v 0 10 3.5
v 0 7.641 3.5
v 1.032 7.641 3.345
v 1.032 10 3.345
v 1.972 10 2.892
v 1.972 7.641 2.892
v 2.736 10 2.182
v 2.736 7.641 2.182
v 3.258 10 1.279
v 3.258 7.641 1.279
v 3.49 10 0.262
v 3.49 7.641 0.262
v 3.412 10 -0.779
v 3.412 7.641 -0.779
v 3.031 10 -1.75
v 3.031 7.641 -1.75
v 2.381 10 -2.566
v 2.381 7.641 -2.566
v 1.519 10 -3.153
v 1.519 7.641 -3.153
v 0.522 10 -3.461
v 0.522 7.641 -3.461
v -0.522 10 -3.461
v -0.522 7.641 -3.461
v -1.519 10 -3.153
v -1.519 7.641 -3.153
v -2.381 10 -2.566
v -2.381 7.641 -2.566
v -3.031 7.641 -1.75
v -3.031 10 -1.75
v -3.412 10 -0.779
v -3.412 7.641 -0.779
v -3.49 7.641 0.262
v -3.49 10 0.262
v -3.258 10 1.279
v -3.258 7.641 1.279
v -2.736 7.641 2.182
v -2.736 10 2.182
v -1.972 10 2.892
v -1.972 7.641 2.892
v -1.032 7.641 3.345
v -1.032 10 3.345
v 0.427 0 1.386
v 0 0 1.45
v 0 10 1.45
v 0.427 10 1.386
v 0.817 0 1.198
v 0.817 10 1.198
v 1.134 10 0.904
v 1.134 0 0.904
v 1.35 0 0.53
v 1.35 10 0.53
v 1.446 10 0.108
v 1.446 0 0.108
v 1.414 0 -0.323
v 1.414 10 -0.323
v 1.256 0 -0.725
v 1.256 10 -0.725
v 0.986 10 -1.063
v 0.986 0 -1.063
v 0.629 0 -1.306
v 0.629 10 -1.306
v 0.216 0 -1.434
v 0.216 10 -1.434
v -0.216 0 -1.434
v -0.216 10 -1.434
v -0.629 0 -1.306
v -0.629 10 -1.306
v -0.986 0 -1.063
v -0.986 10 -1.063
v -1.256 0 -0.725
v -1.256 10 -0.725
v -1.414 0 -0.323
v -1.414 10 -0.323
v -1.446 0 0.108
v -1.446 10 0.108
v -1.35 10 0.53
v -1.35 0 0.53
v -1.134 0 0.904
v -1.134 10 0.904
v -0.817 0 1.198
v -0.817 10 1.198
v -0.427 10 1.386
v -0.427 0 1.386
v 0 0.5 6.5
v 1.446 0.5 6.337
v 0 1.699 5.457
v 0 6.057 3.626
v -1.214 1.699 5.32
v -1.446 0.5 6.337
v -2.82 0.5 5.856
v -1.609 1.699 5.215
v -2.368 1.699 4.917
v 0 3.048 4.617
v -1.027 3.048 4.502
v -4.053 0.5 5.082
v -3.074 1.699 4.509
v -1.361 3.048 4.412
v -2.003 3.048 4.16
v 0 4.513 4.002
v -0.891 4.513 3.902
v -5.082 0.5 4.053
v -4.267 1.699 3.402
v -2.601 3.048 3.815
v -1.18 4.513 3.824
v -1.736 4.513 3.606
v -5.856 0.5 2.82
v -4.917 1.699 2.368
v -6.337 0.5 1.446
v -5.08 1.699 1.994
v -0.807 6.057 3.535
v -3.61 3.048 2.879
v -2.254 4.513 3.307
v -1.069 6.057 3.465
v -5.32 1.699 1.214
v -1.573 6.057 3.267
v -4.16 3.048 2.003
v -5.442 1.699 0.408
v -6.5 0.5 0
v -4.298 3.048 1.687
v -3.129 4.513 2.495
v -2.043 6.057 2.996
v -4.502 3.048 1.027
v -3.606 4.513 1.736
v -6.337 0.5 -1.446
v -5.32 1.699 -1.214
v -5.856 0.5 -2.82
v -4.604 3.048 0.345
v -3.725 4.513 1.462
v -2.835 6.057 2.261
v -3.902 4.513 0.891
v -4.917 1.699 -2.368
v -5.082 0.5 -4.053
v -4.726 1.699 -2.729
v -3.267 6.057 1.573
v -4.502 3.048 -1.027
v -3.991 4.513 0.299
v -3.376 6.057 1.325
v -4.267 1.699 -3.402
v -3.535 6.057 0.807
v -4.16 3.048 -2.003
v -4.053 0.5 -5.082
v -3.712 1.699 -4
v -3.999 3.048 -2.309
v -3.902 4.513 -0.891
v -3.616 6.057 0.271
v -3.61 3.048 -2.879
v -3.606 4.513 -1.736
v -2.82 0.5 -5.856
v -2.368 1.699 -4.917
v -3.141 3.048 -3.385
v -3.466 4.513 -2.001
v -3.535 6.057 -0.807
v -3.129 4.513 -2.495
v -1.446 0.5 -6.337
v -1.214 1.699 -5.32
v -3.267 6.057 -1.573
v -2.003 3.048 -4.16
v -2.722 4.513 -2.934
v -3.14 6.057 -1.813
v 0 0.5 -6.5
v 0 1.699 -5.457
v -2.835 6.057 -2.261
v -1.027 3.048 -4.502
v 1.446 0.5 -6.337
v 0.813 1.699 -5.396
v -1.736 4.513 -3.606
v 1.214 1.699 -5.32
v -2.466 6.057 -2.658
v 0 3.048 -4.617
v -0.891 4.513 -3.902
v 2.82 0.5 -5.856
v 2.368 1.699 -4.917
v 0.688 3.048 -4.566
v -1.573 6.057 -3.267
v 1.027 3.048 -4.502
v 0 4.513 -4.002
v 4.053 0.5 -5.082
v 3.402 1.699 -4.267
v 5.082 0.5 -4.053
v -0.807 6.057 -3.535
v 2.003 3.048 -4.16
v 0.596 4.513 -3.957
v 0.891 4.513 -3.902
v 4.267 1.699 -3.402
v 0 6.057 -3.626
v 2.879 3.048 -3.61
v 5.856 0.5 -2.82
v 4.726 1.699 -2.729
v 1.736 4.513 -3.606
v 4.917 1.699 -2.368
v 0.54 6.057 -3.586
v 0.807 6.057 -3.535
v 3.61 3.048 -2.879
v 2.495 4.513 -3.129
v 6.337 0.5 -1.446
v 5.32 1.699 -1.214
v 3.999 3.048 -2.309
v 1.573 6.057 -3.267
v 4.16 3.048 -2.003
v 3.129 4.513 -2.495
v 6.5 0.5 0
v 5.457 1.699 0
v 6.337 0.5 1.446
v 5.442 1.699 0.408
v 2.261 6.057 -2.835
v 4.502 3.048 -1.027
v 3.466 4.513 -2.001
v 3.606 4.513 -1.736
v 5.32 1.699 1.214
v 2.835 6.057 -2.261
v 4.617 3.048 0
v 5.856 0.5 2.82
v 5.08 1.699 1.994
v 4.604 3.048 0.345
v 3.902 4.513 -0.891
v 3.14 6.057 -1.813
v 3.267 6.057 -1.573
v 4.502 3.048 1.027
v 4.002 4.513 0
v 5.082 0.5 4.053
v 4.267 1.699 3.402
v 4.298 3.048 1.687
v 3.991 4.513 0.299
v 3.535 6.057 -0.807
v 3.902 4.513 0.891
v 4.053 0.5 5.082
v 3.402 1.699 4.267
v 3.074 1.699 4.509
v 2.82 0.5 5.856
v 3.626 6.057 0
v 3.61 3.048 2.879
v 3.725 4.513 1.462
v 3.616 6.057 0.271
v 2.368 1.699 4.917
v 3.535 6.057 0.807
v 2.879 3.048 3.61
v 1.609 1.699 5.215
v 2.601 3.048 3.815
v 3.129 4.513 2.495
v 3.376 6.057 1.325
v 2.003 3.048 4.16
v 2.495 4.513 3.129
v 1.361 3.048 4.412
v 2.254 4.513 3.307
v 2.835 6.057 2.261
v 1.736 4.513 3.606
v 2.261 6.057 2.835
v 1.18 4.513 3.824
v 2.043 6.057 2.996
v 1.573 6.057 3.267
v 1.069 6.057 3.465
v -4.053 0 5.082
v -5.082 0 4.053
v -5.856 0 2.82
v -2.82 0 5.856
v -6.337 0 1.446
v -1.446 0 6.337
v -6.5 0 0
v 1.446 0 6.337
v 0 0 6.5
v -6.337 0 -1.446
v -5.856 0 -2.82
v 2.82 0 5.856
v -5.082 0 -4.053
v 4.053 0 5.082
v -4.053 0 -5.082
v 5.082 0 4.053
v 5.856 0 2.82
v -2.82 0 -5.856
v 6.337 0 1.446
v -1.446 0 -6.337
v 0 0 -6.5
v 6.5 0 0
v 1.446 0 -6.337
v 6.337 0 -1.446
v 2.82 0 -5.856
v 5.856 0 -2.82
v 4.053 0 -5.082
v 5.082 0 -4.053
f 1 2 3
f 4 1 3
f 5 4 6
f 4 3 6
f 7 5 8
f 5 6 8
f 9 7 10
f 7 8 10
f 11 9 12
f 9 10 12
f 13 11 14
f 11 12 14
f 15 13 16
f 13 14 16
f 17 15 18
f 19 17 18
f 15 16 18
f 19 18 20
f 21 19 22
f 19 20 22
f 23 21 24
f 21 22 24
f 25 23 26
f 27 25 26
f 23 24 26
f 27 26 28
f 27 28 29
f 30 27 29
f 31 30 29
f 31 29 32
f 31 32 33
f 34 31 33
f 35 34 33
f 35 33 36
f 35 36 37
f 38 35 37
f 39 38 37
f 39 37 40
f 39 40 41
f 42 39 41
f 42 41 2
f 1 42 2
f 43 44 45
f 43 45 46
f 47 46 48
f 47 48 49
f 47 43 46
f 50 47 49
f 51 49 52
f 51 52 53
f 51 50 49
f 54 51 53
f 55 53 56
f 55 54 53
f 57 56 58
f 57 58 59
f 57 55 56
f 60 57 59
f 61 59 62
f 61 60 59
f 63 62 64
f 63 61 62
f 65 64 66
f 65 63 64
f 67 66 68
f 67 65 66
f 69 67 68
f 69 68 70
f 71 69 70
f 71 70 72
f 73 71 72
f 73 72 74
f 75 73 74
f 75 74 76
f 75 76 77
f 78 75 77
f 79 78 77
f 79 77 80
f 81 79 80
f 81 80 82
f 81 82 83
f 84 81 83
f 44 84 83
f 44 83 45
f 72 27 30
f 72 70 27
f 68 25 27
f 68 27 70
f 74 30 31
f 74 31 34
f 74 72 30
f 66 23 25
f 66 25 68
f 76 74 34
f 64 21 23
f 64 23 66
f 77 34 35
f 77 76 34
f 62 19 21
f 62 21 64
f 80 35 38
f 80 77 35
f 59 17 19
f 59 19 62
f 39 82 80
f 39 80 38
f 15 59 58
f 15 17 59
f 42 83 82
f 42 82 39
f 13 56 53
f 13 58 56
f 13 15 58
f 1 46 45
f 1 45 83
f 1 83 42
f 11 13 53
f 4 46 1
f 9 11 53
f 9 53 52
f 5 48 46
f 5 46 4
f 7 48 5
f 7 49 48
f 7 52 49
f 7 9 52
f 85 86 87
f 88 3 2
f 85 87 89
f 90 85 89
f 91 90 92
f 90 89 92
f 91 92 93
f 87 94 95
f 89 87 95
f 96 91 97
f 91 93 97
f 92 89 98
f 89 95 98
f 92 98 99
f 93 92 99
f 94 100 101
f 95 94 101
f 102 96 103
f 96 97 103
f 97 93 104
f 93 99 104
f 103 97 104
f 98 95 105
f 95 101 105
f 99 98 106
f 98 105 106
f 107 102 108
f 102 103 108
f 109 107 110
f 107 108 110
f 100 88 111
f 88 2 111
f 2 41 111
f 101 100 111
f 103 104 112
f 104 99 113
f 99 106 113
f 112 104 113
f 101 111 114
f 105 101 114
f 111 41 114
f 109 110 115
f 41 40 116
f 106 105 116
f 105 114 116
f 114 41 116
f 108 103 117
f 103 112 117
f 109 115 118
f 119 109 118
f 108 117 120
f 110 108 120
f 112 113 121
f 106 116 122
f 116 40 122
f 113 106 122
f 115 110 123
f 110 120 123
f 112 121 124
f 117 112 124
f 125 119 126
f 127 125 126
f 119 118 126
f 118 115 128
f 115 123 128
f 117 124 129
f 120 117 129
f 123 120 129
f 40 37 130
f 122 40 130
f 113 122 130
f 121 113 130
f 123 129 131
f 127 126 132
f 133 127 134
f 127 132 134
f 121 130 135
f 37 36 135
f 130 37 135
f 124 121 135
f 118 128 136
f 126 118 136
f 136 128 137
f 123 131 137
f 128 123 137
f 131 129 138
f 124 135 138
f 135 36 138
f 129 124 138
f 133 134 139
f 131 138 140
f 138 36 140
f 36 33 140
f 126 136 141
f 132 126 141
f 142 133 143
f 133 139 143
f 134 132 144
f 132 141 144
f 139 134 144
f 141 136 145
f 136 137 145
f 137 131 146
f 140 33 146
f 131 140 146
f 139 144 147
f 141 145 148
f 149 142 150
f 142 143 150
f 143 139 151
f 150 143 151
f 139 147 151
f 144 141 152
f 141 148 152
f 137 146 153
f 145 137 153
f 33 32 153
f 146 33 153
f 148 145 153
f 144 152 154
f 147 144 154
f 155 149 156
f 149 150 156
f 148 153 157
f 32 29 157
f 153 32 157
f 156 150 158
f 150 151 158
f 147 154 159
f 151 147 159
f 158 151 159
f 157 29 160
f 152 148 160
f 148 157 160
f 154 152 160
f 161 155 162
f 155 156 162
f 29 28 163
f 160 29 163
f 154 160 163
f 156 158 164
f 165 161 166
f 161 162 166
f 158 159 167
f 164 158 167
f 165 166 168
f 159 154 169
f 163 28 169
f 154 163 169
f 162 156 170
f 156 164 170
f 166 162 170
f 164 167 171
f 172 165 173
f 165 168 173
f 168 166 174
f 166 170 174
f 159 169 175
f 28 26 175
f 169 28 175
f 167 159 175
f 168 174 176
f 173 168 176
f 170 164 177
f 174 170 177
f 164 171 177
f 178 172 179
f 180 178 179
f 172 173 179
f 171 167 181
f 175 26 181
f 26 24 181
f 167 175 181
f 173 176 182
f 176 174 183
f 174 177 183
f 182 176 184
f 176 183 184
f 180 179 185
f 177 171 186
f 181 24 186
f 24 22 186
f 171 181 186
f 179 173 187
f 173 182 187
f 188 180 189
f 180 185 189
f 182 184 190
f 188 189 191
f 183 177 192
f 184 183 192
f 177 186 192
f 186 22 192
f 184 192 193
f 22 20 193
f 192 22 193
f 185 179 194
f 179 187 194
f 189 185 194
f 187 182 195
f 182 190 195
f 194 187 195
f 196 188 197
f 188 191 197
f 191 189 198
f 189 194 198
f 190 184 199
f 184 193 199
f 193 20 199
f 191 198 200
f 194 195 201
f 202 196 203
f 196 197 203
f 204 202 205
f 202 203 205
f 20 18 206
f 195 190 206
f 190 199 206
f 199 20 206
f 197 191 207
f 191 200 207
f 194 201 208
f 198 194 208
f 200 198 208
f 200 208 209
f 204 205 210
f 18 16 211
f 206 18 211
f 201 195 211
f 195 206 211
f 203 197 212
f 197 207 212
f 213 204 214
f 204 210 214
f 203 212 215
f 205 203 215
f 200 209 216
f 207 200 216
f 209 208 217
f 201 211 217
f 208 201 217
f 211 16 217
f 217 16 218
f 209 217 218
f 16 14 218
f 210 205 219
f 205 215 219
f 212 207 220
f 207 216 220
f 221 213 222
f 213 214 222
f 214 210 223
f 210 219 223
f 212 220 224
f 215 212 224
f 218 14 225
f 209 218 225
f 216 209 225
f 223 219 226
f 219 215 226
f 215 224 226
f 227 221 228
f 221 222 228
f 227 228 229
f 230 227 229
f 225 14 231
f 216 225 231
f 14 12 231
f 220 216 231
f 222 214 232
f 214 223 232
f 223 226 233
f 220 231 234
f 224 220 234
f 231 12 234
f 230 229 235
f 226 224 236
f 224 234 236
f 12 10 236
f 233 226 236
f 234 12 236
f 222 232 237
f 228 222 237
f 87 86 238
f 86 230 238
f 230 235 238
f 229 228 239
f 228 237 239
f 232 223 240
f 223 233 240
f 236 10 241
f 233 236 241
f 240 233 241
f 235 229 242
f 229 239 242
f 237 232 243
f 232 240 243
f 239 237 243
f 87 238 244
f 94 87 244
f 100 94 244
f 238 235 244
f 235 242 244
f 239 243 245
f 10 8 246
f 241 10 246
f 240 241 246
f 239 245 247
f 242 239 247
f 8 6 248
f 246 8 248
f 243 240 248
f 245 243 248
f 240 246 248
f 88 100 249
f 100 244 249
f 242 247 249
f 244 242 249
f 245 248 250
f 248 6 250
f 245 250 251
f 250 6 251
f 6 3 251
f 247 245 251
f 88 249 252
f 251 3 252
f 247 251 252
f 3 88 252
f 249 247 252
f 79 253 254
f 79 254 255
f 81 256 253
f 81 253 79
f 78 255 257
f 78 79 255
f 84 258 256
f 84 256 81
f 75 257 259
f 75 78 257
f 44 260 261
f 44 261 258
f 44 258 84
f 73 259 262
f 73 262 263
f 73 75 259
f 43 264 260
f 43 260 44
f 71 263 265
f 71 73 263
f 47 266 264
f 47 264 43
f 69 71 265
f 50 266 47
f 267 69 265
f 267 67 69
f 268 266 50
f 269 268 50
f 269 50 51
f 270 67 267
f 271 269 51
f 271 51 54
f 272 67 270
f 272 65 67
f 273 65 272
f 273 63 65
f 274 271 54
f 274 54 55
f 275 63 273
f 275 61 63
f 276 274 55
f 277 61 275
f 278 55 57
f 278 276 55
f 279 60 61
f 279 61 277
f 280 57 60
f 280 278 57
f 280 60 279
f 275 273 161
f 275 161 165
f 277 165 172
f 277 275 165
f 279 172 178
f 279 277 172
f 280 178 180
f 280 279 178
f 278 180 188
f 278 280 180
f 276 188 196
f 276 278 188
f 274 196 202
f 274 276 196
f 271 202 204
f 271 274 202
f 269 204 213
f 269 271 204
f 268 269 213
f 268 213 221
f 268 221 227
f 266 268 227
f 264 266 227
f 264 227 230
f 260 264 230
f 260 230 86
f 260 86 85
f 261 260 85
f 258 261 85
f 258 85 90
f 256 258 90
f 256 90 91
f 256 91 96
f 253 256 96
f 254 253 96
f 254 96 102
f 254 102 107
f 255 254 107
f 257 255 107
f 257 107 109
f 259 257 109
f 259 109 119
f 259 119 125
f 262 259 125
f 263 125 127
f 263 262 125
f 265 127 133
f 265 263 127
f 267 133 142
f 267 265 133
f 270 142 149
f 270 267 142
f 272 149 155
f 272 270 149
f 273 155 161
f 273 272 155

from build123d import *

# Parameters (mm, degrees)
SKETCH1_R           = 3.5
SKETCH1_R_2         = 1.45
BOSS_EXTRUDE1_DEPTH = 10
SKETCH2_R           = 6.5
SKETCH2_R_2         = 3.5
SKETCH2_R_3         = 1.45
BOSS_EXTRUDE2_DEPTH = 0.5
FILLET1_R           = 10


with BuildPart() as part:
    # Sketch1 → Boss-Extrude1 (new body)
    with BuildSketch(Plane(origin=(0, 0, 0), x_dir=(1, 0, 0), z_dir=(0, 1, 0))):
        with Locations(Location((0, 0, 0), (0, 0, 270))):
            Circle(SKETCH1_R)
        with Locations(Location((0, 0, 0), (0, 0, 270))):
            Circle(SKETCH1_R_2, mode=Mode.SUBTRACT)
    extrude(amount=BOSS_EXTRUDE1_DEPTH)

    # Sketch2 → Boss-Extrude2 (add)
    # profile 1 of 2: a face of its own
    with BuildSketch(Plane.XZ):
        with Locations(Location((0, 0, 0), (0, 0, 270))):
            Circle(SKETCH2_R)
        with Locations(Location((0, 0, 0), (0, 0, 270))):
            Circle(SKETCH2_R_2, mode=Mode.SUBTRACT)
    # profile 2 of 2: a face of its own
    with BuildSketch(Plane.XZ):
        with Locations(Location((0, 0, 0), (0, 0, 270))):
            Circle(SKETCH2_R_2)
        with Locations(Location((0, 0, 0), (0, 0, 90))):
            Circle(SKETCH2_R_3, mode=Mode.SUBTRACT)
    extrude(amount=-BOSS_EXTRUDE2_DEPTH)

    # Fillet1
    # the kernel refuses this fillet: 10 mm, written as the material it adds along each edge
    with BuildSketch(Plane(origin=(0, 0.5, 0), x_dir=(0, 0, 1), z_dir=(1, 0, 0))) as fillet1_piece_1:
        with BuildLine():
            CenterArc((13.5, -7.141428429), FILLET1_R, 134.427004001, 45.572995999)
            Line((3.5, -7.141428429), (3.3, -7.141428429))
            Line((3.3, -7.141428429), (3.3, 0))
            Line((3.3, 0), (3.5, 0.2))
            ThreePointArc((3.5, 0.2), (5, 0.2), (6.36, 0.142828569))
            Line((6.36, 0.142828569), (6.5, 0))
        make_face()
    revolve(axis=Axis((0, 0.5, 0), (0, -1, 0)))


solid = part.part
